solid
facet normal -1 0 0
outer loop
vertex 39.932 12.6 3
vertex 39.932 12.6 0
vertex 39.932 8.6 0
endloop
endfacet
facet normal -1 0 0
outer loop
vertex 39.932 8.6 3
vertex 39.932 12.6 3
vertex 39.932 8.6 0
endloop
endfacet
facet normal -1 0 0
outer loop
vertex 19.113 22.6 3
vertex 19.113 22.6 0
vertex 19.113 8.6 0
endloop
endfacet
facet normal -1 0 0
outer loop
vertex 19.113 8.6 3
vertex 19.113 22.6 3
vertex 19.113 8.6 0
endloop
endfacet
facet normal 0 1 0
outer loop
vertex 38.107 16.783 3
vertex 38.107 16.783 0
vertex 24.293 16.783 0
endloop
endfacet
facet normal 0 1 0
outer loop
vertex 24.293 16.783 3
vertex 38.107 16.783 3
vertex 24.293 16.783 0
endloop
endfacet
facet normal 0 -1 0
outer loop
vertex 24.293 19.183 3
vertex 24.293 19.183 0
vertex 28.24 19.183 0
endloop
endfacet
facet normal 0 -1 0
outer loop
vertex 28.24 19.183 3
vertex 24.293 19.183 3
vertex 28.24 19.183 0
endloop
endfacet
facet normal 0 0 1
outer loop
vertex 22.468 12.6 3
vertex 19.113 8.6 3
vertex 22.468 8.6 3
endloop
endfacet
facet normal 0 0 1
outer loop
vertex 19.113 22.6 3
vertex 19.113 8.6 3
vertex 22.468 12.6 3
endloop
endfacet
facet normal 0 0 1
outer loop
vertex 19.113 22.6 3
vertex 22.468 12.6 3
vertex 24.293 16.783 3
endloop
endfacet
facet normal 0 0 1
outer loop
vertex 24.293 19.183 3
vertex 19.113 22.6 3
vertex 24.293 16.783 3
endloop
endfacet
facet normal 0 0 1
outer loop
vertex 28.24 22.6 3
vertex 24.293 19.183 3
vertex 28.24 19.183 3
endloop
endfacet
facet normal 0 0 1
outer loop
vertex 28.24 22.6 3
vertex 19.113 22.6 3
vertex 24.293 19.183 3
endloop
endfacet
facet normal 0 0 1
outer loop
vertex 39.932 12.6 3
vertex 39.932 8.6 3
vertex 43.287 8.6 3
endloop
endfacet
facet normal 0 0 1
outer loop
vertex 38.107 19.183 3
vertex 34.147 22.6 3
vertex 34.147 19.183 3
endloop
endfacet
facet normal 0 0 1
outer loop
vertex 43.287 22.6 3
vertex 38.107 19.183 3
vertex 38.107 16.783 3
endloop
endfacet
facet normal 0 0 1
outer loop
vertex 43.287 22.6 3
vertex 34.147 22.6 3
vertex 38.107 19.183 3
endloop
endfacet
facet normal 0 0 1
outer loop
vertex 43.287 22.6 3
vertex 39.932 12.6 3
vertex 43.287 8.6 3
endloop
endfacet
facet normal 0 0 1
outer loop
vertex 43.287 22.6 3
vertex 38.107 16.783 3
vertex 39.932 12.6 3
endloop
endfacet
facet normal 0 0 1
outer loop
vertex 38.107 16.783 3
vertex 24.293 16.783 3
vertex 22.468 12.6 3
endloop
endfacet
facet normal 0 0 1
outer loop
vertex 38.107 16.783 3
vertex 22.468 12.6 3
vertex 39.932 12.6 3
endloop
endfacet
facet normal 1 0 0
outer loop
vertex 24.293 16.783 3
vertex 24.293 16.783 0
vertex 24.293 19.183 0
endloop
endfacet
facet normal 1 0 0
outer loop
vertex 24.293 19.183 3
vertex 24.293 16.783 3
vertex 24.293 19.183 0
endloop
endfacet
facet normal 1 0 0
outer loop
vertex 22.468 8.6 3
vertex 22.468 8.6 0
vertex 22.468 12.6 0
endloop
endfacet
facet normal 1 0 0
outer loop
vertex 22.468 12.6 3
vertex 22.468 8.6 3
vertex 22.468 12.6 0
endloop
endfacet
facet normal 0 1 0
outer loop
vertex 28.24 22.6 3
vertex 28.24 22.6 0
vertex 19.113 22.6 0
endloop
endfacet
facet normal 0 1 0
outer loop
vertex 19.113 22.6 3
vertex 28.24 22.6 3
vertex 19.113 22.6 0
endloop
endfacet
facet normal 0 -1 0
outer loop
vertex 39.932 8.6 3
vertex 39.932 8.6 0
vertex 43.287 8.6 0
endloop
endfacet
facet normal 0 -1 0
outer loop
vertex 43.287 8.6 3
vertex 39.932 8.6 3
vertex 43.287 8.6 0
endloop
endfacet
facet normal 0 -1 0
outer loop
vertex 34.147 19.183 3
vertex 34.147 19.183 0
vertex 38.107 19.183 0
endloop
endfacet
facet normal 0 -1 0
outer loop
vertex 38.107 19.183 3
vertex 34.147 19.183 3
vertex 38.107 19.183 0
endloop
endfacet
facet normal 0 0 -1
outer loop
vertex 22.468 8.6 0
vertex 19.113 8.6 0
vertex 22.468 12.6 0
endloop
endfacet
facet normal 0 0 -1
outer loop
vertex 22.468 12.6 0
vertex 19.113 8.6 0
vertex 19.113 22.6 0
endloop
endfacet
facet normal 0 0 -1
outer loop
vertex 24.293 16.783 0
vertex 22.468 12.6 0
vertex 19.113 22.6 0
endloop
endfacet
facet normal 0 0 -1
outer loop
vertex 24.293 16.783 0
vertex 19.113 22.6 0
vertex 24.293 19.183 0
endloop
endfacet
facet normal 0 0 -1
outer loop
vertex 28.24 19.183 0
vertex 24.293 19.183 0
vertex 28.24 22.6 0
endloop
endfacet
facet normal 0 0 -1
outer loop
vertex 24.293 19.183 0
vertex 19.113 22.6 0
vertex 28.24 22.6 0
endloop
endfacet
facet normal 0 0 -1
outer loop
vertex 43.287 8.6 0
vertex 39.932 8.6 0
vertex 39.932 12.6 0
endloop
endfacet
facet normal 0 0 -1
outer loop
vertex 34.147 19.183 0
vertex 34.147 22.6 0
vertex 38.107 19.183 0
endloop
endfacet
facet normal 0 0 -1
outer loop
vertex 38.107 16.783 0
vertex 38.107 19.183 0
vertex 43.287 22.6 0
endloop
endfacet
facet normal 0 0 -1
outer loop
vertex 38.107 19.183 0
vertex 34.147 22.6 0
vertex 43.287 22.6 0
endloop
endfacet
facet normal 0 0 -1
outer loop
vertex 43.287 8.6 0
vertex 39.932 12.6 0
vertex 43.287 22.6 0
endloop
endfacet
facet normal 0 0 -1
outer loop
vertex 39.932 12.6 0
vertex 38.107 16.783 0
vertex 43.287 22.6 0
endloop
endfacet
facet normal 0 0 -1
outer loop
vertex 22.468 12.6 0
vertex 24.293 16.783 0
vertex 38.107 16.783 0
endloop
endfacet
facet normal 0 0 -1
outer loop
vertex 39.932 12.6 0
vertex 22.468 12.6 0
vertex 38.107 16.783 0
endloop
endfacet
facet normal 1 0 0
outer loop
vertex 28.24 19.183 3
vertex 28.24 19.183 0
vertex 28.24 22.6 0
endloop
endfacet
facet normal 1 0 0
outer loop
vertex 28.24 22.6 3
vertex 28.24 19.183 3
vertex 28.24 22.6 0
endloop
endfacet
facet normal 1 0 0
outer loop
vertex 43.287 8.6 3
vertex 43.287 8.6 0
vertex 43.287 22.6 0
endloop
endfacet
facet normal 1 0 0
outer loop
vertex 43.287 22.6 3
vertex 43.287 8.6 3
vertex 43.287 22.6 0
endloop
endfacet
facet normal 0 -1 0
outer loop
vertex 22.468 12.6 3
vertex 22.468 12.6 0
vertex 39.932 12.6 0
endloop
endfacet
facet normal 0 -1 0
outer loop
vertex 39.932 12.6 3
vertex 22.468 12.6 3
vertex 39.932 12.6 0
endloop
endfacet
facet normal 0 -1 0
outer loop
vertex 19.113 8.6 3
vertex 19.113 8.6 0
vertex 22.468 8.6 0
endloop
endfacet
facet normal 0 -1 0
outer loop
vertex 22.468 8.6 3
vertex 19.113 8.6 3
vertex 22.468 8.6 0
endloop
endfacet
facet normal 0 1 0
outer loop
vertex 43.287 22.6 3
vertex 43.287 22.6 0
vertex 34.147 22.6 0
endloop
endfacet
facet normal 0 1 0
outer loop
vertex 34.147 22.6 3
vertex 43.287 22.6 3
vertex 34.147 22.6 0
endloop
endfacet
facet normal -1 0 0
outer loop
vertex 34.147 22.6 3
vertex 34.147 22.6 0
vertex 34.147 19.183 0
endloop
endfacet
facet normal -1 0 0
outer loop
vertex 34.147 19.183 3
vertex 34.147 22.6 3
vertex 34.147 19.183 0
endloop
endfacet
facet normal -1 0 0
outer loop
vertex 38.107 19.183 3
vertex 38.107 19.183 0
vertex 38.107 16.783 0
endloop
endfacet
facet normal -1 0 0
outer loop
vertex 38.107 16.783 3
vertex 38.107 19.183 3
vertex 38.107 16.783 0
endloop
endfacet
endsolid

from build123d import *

# Parameters (mm, degrees)
SALIENTE_EXTRUIR1_DEPTH = 3


with BuildPart() as part:
    # Model → Saliente-Extruir1 (new body)
    with BuildSketch(Plane.XY):
        Polygon((31.7, 16.782683294), (24.293333333, 16.782683294), (24.293333333, 19.182683294), (28.24, 19.182683294), (28.24, 22.6), (19.113333333, 22.6), (19.113333333, 8.6), (22.468, 8.6), (22.468, 12.6), (39.932, 12.6), (39.932, 8.6), (43.286666667, 8.6), (43.286666667, 22.6), (34.14656693, 22.6), (34.14656693, 19.182683294), (38.106666667, 19.182683294), (38.106666667, 16.782683294), align=None)
    extrude(amount=SALIENTE_EXTRUIR1_DEPTH)


solid = part.part
